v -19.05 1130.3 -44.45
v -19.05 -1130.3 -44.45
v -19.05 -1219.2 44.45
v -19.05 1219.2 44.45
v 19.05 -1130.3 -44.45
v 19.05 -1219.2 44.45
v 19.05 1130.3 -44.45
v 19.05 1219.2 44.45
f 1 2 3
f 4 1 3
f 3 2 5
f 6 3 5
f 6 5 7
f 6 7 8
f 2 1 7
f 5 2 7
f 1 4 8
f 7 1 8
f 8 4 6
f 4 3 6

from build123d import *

# Parameters (mm, degrees)
F0_W     = 38.1
F0_H     = 88.9
F1_DEPTH = 1219.2
F2_SIZE2 = 88.89999
F2_SIZE  = 88.89999
F3_SIZE2 = 88.89999
F3_SIZE  = 88.89999


# Not quite as in the source:
# - a fillet or chamfer is up to 0.001 mm smaller than in the source, because OpenCascade refuses the exact size


with BuildPart() as f1:
    # F0 (on Front) → F1 (new body, symmetric)
    with BuildSketch(Plane.XZ):
        Rectangle(F0_W, F0_H)
    extrude(amount=F1_DEPTH, both=True)

    # F2 (size 88.9 and 88.9 in the source; OpenCascade refuses exactly that, so slightly less here)
    f2_edges = [f1.edges().sort_by_distance(p)[0] for p in [
        (0, -1219.2, -44.45),
    ]]
    chamfer(f2_edges, length=F2_SIZE, length2=F2_SIZE2)

    # F3 (size 88.9 and 88.9 in the source; OpenCascade refuses exactly that, so slightly less here)
    f3_edges = [f1.edges().sort_by_distance(p)[0] for p in [
        (0, 1219.2, -44.45),
    ]]
    chamfer(f3_edges, length=F3_SIZE, length2=F3_SIZE2)


solid = f1.part
